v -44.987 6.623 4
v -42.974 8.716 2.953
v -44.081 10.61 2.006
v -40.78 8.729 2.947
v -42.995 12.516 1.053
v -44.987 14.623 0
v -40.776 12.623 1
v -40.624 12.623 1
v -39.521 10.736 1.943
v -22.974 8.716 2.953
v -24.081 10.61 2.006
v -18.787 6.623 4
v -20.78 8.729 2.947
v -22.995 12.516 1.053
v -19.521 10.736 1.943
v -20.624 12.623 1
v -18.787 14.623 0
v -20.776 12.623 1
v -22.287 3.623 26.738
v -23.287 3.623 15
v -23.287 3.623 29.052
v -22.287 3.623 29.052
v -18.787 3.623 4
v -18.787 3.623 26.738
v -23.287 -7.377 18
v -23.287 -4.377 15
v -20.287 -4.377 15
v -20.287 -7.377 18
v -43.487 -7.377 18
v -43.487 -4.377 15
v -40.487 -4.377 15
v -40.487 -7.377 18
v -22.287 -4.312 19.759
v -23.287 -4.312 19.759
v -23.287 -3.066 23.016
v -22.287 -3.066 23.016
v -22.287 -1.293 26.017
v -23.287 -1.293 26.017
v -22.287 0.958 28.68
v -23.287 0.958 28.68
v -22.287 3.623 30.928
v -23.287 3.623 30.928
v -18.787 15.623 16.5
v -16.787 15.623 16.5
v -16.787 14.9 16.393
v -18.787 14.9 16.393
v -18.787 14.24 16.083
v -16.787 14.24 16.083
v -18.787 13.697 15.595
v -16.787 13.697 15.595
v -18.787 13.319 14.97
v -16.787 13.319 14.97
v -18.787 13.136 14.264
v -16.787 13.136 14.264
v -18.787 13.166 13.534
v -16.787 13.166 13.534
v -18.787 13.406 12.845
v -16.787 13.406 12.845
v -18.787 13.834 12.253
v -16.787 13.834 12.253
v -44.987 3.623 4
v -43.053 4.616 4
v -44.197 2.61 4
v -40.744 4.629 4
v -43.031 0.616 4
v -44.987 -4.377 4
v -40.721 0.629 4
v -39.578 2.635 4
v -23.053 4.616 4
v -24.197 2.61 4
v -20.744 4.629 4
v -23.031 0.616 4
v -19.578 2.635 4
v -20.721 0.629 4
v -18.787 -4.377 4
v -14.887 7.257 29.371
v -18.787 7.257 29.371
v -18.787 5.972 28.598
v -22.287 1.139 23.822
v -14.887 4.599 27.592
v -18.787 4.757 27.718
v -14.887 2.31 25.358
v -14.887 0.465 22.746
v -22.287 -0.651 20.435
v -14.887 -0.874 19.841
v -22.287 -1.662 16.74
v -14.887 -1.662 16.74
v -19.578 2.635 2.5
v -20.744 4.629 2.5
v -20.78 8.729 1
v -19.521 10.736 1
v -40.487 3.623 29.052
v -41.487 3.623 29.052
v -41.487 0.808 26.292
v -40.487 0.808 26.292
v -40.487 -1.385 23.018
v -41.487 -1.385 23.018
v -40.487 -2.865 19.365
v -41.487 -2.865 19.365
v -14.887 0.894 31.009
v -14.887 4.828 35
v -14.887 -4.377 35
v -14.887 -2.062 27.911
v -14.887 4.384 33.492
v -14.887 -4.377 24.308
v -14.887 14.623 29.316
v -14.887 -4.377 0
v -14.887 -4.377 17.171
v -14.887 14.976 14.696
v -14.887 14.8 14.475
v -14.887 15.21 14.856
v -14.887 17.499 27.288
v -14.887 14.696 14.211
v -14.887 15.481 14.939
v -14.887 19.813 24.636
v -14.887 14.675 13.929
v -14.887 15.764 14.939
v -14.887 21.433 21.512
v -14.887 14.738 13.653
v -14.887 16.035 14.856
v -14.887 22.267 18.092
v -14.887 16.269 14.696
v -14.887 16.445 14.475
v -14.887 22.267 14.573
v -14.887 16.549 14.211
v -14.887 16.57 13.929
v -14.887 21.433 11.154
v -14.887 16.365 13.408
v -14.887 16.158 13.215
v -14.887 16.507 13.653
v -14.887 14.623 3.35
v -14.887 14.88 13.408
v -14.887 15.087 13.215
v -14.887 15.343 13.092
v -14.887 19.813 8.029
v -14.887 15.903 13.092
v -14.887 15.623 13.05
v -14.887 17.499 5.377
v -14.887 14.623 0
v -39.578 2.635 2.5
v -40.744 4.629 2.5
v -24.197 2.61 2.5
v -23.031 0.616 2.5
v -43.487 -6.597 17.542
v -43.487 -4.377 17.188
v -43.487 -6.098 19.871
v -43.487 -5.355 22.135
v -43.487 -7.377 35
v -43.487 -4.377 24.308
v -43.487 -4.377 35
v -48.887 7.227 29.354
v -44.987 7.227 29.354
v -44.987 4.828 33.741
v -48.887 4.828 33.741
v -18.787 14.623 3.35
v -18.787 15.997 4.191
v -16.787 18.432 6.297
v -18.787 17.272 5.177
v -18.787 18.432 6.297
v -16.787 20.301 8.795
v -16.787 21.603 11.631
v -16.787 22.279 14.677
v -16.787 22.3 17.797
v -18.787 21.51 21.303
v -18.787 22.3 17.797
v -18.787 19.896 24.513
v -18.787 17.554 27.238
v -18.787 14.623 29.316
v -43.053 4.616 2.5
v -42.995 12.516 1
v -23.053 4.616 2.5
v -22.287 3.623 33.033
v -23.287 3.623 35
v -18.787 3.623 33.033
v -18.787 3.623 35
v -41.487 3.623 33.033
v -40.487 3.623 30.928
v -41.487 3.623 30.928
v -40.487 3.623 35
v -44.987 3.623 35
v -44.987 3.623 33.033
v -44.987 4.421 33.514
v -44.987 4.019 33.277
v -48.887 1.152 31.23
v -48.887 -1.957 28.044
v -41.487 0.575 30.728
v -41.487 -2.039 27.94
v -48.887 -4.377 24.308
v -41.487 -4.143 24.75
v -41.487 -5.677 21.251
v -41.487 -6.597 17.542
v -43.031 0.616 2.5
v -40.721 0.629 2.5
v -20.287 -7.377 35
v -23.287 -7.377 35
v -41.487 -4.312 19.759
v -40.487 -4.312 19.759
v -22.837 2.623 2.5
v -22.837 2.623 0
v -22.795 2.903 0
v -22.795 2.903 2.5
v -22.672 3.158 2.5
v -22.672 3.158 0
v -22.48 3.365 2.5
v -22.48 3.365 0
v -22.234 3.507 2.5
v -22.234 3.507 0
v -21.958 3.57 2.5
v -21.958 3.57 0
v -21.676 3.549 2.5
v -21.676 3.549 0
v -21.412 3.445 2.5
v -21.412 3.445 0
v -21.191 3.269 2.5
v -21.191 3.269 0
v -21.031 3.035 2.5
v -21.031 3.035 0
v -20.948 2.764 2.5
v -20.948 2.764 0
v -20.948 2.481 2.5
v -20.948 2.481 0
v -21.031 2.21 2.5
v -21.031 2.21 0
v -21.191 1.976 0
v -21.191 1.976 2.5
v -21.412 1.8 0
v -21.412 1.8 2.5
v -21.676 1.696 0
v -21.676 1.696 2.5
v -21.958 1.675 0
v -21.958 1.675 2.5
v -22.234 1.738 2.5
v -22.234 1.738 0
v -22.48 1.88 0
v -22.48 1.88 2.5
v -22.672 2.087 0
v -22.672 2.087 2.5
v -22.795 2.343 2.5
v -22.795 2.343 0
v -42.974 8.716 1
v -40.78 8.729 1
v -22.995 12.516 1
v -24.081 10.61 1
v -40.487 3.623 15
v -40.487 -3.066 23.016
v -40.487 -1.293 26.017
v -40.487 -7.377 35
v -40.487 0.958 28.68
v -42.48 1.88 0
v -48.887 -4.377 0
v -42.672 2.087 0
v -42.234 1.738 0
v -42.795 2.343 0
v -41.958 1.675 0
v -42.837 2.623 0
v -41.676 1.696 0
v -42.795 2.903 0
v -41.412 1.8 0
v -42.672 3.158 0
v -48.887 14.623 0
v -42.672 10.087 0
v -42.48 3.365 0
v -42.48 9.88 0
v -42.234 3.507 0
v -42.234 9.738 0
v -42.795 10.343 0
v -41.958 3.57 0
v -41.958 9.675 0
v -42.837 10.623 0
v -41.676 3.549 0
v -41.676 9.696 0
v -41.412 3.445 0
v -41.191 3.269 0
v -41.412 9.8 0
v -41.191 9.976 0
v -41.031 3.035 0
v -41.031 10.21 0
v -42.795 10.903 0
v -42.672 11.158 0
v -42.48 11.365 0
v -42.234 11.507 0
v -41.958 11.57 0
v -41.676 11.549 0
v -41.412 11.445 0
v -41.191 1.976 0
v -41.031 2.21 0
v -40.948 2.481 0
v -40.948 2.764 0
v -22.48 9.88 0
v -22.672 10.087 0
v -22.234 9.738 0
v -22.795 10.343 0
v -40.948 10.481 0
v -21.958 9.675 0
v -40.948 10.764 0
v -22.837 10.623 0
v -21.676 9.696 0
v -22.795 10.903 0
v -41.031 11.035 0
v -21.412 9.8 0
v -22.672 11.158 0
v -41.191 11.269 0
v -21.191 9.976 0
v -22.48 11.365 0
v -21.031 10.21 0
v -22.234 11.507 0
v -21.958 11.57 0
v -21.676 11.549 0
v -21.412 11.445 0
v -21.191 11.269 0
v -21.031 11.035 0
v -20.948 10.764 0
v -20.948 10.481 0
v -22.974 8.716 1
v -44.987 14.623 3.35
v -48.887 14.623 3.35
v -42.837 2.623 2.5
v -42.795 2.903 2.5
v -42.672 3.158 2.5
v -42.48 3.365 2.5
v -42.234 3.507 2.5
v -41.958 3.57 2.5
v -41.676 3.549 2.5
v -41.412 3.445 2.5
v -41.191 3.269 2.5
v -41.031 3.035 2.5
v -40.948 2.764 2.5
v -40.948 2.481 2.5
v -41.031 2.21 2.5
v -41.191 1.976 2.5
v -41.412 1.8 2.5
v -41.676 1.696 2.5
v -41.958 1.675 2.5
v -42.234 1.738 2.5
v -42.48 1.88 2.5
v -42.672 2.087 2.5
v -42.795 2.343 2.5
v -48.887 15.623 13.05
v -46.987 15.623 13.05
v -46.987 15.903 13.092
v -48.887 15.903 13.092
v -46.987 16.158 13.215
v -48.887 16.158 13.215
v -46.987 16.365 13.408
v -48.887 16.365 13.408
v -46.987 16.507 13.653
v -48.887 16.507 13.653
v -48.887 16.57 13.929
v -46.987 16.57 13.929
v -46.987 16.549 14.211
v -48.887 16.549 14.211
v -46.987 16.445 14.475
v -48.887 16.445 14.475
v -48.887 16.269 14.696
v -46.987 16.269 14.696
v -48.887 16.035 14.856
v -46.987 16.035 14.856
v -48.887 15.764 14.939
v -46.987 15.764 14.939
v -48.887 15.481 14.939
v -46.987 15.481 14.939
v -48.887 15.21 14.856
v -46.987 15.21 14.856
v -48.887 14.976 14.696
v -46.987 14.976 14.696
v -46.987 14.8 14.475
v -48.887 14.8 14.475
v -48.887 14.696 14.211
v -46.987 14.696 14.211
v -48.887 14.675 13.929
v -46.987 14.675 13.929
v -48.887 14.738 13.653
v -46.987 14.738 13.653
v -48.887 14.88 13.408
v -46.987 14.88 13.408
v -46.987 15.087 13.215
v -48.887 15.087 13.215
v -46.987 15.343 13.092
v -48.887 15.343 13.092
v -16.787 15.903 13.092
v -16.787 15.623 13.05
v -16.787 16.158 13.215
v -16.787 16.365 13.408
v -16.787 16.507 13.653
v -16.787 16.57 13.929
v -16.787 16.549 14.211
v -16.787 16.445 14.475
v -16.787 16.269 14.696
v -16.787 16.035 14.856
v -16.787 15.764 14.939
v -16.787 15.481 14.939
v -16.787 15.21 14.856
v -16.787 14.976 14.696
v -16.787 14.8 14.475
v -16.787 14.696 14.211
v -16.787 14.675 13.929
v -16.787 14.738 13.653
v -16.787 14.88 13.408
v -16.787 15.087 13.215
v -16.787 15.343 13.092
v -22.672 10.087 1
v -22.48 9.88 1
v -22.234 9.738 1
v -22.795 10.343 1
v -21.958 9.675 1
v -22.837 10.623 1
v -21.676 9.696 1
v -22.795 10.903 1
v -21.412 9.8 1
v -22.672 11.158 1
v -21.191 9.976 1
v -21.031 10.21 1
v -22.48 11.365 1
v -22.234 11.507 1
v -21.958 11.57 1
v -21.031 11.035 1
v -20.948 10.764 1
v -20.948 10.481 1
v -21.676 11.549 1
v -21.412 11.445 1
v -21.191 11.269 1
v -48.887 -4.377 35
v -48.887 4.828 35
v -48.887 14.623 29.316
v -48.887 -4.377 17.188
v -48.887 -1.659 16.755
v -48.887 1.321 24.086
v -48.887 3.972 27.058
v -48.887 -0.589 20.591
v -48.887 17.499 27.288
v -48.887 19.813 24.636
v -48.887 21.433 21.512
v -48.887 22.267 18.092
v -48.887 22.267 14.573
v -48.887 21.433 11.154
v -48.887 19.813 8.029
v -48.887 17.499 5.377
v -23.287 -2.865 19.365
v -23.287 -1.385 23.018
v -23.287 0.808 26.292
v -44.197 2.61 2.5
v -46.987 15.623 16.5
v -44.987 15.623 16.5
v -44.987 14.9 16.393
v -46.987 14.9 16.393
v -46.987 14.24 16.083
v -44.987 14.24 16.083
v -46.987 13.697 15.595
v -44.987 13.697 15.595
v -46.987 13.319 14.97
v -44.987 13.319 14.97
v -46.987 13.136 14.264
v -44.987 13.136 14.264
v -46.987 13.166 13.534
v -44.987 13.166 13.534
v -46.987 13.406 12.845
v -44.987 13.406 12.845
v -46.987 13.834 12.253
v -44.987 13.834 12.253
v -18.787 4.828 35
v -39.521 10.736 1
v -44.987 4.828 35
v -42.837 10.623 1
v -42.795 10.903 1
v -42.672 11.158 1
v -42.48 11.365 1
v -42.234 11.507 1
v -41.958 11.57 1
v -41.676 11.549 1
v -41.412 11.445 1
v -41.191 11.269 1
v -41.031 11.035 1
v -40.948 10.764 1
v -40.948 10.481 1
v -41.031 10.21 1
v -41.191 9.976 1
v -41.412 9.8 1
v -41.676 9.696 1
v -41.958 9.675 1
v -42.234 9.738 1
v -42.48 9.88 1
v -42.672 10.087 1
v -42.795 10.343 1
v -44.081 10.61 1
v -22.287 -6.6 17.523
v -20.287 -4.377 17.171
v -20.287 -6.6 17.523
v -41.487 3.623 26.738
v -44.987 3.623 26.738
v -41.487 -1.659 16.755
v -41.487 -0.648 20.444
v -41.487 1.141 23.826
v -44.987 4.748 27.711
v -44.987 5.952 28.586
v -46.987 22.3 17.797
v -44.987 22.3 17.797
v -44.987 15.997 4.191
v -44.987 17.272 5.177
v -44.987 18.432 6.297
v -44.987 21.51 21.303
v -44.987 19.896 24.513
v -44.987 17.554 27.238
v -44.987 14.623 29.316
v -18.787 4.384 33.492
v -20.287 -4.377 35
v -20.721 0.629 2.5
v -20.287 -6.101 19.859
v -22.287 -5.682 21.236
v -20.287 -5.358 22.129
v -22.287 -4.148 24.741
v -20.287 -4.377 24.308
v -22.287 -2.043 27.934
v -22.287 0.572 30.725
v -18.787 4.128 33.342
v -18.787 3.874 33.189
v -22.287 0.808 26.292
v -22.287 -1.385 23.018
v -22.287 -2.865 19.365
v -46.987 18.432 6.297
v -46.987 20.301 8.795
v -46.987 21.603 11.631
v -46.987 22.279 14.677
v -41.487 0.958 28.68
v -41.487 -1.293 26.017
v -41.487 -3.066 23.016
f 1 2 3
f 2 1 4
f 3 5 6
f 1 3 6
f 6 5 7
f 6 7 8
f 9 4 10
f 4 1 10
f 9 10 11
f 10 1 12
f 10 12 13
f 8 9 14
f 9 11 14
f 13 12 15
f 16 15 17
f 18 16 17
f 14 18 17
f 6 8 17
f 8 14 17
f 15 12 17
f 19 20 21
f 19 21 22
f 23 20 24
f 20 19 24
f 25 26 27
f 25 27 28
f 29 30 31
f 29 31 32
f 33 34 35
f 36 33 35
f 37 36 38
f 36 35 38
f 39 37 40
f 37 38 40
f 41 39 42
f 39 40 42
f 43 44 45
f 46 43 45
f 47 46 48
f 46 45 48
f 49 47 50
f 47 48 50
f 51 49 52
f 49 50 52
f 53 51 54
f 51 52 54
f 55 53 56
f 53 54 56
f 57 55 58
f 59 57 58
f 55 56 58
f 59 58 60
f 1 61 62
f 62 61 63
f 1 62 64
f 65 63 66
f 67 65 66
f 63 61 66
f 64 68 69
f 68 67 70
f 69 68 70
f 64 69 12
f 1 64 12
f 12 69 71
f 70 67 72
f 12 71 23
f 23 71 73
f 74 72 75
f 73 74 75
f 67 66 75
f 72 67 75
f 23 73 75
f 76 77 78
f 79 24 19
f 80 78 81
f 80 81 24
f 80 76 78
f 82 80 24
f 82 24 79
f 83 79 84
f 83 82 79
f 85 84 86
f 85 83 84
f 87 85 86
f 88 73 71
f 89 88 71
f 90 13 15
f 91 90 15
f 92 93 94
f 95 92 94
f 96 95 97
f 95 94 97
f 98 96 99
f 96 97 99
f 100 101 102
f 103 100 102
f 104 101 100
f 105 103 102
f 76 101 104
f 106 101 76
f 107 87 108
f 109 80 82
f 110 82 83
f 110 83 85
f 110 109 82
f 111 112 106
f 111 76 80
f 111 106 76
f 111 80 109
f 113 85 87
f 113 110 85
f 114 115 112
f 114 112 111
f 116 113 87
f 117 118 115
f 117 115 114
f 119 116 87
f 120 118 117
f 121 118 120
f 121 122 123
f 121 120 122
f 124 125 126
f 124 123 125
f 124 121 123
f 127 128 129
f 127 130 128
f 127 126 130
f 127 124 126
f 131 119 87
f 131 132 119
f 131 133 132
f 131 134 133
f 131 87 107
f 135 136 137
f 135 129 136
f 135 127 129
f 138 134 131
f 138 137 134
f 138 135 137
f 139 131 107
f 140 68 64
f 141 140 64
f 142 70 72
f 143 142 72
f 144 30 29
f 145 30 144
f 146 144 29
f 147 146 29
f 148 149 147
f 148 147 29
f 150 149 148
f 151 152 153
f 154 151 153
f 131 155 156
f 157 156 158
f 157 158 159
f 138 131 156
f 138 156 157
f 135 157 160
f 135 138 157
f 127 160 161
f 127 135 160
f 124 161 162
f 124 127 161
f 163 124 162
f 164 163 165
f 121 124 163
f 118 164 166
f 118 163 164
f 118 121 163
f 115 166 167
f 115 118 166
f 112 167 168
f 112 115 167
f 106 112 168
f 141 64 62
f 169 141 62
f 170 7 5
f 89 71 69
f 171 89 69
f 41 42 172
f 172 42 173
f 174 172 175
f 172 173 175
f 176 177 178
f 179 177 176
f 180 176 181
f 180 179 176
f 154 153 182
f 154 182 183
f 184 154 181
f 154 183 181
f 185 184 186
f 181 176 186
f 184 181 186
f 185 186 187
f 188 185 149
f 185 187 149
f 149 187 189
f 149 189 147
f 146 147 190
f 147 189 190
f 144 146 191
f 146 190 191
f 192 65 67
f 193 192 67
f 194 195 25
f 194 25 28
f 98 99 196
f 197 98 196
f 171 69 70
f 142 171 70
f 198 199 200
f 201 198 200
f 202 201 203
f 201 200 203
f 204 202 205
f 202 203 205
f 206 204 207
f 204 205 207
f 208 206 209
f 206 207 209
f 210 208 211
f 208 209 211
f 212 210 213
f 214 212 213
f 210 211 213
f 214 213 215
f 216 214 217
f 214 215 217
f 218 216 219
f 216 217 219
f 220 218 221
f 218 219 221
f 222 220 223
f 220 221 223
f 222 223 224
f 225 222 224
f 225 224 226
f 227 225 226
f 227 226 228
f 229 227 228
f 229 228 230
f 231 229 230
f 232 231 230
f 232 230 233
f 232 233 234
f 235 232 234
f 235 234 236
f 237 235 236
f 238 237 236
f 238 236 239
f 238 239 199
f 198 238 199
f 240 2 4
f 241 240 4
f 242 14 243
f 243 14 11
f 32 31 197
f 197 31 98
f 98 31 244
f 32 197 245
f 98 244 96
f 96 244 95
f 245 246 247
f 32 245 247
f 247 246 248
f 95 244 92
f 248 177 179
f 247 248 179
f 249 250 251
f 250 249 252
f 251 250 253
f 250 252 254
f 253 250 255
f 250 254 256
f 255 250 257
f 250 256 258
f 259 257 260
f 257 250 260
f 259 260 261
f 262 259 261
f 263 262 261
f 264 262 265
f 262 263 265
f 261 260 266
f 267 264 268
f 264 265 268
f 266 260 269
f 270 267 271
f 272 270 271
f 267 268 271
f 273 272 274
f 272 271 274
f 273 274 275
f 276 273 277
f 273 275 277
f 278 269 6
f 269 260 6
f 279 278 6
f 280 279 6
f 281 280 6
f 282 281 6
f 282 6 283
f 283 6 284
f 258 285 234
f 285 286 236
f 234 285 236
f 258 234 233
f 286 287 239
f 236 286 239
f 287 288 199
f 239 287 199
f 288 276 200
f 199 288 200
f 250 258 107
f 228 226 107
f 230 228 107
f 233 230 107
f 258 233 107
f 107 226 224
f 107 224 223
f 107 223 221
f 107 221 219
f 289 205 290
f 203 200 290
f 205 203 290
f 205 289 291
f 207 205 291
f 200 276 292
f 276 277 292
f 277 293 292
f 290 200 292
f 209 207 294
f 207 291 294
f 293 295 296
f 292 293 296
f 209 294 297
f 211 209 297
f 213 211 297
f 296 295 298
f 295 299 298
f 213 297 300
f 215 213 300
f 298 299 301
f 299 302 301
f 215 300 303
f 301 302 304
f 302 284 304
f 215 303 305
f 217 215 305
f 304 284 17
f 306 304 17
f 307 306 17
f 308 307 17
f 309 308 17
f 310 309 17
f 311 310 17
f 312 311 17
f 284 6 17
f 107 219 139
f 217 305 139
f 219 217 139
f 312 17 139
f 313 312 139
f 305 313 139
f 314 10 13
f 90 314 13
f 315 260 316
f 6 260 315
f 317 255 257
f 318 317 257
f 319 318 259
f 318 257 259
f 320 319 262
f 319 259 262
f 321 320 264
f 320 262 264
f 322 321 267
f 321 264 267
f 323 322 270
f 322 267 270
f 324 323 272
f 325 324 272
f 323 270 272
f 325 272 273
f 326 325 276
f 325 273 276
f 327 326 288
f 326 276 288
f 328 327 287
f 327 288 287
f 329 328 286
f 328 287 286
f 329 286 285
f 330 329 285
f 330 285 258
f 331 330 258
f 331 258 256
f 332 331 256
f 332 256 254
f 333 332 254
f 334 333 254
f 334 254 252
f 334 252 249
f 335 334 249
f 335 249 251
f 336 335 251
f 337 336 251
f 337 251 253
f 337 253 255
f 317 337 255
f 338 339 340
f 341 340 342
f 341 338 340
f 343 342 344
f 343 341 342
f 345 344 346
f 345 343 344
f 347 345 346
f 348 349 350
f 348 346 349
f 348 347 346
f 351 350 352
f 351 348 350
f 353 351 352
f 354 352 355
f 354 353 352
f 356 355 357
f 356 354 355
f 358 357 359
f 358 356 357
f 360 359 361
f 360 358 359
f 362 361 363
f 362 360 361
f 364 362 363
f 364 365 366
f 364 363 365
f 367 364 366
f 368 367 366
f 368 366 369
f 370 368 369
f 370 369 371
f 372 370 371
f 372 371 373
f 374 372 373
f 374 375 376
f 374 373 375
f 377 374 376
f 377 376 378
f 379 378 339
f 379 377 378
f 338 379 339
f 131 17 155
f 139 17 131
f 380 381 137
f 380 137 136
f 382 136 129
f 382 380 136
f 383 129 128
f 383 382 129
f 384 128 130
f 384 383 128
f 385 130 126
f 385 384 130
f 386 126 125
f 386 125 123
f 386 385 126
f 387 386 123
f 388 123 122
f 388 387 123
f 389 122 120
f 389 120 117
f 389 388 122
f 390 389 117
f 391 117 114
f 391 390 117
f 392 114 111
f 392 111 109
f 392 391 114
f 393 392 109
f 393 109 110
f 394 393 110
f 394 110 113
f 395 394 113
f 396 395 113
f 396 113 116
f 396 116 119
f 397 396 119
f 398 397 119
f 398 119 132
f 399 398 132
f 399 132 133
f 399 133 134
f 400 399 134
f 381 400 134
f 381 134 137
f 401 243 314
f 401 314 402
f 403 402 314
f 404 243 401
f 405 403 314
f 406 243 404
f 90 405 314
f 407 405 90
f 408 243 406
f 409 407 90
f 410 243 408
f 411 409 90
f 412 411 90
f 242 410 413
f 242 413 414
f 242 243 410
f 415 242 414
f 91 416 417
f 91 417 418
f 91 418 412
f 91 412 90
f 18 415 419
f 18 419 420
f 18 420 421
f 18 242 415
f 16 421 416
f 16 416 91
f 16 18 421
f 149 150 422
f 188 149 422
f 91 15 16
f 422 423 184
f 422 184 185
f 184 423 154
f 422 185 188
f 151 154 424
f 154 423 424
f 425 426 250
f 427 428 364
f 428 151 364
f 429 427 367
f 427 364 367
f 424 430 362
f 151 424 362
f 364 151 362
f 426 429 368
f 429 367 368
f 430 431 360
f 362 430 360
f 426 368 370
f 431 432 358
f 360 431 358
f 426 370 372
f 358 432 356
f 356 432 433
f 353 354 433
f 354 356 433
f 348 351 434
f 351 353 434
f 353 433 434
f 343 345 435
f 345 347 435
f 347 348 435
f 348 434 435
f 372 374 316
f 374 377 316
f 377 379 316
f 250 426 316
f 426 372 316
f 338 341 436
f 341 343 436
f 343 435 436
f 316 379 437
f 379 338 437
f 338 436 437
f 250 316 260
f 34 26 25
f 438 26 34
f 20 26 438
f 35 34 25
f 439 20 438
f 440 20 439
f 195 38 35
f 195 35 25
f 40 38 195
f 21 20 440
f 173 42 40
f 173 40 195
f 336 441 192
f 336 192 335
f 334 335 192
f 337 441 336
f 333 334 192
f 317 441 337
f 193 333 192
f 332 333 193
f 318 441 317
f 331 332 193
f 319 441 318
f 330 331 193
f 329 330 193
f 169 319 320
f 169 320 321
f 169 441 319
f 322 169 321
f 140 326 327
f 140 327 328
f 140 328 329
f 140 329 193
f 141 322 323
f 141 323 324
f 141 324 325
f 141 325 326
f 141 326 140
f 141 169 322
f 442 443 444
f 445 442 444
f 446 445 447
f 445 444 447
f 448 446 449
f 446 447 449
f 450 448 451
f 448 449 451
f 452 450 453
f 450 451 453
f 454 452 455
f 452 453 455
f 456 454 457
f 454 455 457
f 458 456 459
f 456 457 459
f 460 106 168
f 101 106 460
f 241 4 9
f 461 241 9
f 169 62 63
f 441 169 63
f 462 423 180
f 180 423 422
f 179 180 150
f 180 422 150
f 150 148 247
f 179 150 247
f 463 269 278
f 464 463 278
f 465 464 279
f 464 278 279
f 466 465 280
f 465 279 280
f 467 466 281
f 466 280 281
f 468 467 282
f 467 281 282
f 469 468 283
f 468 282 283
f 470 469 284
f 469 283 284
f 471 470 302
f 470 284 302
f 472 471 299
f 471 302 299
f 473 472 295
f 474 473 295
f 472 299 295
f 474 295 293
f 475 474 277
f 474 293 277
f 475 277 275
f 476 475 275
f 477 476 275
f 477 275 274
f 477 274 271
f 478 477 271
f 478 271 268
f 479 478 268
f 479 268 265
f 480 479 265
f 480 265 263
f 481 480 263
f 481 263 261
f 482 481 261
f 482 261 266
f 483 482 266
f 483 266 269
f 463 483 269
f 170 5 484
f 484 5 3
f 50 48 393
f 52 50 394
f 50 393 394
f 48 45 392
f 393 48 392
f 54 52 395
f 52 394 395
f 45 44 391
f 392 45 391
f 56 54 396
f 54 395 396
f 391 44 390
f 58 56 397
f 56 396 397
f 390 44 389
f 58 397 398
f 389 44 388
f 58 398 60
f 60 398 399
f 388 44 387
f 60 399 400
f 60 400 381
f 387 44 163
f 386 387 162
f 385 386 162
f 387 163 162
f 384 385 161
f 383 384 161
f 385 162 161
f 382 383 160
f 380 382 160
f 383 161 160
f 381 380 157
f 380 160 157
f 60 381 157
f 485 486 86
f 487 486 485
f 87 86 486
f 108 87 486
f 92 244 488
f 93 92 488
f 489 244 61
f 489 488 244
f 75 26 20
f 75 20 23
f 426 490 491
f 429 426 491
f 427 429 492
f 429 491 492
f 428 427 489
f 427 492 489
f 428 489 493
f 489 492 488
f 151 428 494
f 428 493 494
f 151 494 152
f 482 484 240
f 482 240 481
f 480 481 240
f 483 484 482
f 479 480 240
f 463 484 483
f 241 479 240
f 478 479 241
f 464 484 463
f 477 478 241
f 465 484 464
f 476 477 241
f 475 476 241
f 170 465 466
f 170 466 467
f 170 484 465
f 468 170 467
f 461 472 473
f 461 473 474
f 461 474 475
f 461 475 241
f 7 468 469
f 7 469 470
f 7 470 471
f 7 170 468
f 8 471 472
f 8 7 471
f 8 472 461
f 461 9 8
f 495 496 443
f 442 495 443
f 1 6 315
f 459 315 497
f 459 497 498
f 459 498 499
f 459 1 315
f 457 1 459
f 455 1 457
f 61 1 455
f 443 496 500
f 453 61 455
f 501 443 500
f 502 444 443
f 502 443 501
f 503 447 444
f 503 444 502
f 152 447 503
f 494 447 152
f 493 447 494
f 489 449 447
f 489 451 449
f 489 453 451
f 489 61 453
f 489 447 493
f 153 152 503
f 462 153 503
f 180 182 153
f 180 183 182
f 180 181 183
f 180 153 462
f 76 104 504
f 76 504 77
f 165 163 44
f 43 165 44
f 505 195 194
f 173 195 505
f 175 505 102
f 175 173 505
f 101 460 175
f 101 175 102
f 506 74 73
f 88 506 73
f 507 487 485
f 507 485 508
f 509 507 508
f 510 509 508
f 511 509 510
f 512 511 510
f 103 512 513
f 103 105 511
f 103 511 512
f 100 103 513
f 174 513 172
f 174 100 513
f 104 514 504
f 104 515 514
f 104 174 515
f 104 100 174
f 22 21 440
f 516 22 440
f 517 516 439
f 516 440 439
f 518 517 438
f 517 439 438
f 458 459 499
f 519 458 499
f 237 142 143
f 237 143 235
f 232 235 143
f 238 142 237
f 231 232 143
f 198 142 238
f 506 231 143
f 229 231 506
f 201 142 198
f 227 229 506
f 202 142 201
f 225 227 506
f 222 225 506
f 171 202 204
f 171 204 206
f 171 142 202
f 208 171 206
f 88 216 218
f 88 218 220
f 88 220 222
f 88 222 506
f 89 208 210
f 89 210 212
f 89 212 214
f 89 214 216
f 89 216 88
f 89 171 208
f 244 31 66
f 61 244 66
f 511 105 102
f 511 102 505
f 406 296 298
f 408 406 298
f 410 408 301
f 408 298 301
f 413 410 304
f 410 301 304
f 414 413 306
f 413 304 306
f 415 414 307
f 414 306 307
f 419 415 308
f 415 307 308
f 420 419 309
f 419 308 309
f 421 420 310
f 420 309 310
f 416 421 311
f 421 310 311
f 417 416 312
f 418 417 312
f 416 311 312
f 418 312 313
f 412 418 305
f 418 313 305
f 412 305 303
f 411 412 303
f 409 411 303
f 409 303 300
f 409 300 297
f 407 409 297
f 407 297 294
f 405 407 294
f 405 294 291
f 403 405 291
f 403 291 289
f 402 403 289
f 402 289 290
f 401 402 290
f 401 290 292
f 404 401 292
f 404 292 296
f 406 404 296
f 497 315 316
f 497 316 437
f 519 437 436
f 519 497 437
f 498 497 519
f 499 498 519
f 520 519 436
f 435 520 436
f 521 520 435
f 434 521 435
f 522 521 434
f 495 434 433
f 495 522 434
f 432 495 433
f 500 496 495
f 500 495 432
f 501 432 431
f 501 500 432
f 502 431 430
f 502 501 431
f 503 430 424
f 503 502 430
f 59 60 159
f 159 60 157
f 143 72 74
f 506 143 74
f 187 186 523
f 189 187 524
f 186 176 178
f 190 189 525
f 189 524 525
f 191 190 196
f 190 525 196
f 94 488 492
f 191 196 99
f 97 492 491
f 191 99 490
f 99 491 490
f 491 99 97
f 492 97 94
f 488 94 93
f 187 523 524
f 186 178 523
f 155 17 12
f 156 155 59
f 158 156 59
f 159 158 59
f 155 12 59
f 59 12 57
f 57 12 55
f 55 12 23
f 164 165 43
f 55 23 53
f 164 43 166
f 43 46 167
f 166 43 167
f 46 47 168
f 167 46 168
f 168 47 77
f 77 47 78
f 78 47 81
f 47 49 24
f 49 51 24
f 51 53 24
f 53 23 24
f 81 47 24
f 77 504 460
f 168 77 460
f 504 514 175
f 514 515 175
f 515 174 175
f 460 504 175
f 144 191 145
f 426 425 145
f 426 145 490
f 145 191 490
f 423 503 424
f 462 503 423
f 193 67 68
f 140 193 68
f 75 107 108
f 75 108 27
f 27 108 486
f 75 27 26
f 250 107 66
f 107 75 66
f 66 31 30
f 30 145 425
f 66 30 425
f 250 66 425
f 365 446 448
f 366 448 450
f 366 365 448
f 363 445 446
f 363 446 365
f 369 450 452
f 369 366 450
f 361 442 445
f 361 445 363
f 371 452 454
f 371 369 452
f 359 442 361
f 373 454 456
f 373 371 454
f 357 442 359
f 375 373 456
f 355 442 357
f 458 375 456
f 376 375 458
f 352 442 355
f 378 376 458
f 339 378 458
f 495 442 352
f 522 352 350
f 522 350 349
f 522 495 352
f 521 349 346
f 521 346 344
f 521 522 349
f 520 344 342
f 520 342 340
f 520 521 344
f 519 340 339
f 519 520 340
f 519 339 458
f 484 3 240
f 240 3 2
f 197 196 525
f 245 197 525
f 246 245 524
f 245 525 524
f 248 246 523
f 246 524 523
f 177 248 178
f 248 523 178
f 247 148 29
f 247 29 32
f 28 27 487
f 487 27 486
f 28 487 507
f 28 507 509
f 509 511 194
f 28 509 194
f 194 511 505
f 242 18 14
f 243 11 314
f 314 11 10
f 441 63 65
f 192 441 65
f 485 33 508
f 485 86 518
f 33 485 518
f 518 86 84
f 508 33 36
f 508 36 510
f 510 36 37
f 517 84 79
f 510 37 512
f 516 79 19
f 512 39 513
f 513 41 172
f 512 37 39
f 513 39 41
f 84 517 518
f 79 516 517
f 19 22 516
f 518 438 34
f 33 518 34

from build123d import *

# Parameters (mm, degrees)
CROQUIS1_W              = 34
CROQUIS1_H              = 19
SALIENTE_EXTRUIR1_DEPTH = 35
CROQUIS2_W              = 26.2
CROQUIS2_H              = 31
CORTAR_EXTRUIR1_DEPTH   = 25
CORTAR_EXTRUIR3_DEPTH   = 26.2
SALIENTE_EXTRUIR2_DEPTH = 34
CROQUIS10_W             = 26.2
CROQUIS10_H             = 25.966324345
CORTAR_EXTRUIR4_DEPTH   = 10
CROQUIS18_R             = 0.95
CORTAR_EXTRUIR11_DEPTH  = 4
CORTAR_EXTRUIR12_DEPTH  = 1.5
CORTAR_EXTRUIR13_DEPTH  = 3
CORTAR_EXTRUIR14_START  = -34
CROQUIS21_R             = 0.95
CORTAR_EXTRUIR14_DEPTH  = 34
SALIENTE_EXTRUIR3_DEPTH = 8
CORTAR_EXTRUIR16_START  = -34
CORTAR_EXTRUIR16_DEPTH  = 34
CROQUIS25_W             = 3
CROQUIS25_H             = 20
SALIENTE_EXTRUIR4_DEPTH = 3
CORTAR_EXTRUIR17_START  = -23.2
CORTAR_EXTRUIR17_DEPTH  = 23.2
CORTAR_EXTRUIR18_DEPTH  = 7.4
CORTAR_EXTRUIR19_START  = -7.4
CORTAR_EXTRUIR19_DEPTH  = 7.4
CORTAR_EXTRUIR20_START  = -2
CORTAR_EXTRUIR20_DEPTH  = 2
CORTAR_EXTRUIR21_DEPTH  = 28.2
CORTAR_EXTRUIR22_START  = -34
CORTAR_EXTRUIR22_DEPTH  = 34


with BuildPart() as part:
    # Croquis1 → Saliente-Extruir1 (new body)
    with BuildSketch(Plane.XY):
        with Locations((-31.887263086, 5.12254902)):
            Rectangle(CROQUIS1_W, CROQUIS1_H)
    extrude(amount=SALIENTE_EXTRUIR1_DEPTH)

    # Croquis2 → Cortar-Extruir1 (cut)
    with BuildSketch(Plane.XZ.offset(4.37745098)):
        with Locations((-31.887263086, 19.5)):
            Rectangle(CROQUIS2_W, CROQUIS2_H)
    extrude(amount=-CORTAR_EXTRUIR1_DEPTH, mode=Mode.SUBTRACT)

    # Croquis4 → Cortar-Extruir3 (cut)
    with BuildSketch(Plane.ZY.offset(18.787263086)):
        Polygon((4, 14.62254902), (4, 6.62254902), (0, 14.62254902), align=None)
    extrude(amount=CORTAR_EXTRUIR3_DEPTH, mode=Mode.SUBTRACT)

    # Croquis9 → Saliente-Extruir2 (add)
    with BuildSketch(Plane(origin=(-14.887263086, 0, 0), x_dir=(0, 0, -1), z_dir=(1, 0, 0))):
        with BuildLine():
            Line((-29.315831827, 14.62254902), (-3.349507482, 14.62254902))
            ThreePointArc((-3.349507482, 14.62254902), (-16.332669655, 22.37254902), (-29.315831827, 14.62254902))
        make_face()
    extrude(amount=-SALIENTE_EXTRUIR2_DEPTH)

    # Croquis10 → Cortar-Extruir4 (cut)
    with BuildSketch(Plane.XZ.offset(-14.62254902)):
        with Locations((-31.887263086, 16.332669655)):
            Rectangle(CROQUIS10_W, CROQUIS10_H)
    extrude(amount=-CORTAR_EXTRUIR4_DEPTH, mode=Mode.SUBTRACT)

    # Croquis18 → Cortar-Extruir11 (cut)
    with BuildSketch(Plane(origin=(0, 0, 0), x_dir=(-1, 0, 0), z_dir=(0, 0, -1))):
        with Locations((41.887263086, 2.62254902)):
            Circle(CROQUIS18_R)
        with Locations((21.887263086, 2.62254902)):
            Circle(CROQUIS18_R)
        with Locations((21.887263086, 10.62254902)):
            Circle(CROQUIS18_R)
        with Locations((41.887263086, 10.62254902)):
            Circle(CROQUIS18_R)
    extrude(amount=-CORTAR_EXTRUIR11_DEPTH, mode=Mode.SUBTRACT)

    # Croquis19 → Cortar-Extruir12 (cut)
    with BuildSketch(Plane.XY.offset(4)):
        Polygon((-43.030772734, 0.616129568), (-40.721407694, 0.629030888), (-39.577898045, 2.63545034), (-40.743753437, 4.628968471), (-43.053118477, 4.616067151), (-44.196628126, 2.609647699), align=None)
        Polygon((-23.030772734, 0.616129568), (-20.721407694, 0.629030888), (-19.577898045, 2.63545034), (-20.743753437, 4.628968471), (-23.053118477, 4.616067151), (-24.196628126, 2.609647699), align=None)
    extrude(amount=-CORTAR_EXTRUIR12_DEPTH, mode=Mode.SUBTRACT)

    # Croquis20 → Cortar-Extruir13 (cut)
    with BuildSketch(Plane.XY.offset(4)):
        Polygon((-44.081159874, 10.610292765), (-42.973597252, 8.71645054), (-40.779700463, 8.728706795), (-39.520722563, 10.735771313), (-40.628285185, 12.629613538), (-42.994825708, 12.516391244), align=None)
        Polygon((-24.081159874, 10.610292765), (-22.973597252, 8.71645054), (-20.779700463, 8.728706795), (-19.520722563, 10.735771313), (-20.628285185, 12.629613538), (-22.994825708, 12.516391244), align=None)
    extrude(amount=-CORTAR_EXTRUIR13_DEPTH, mode=Mode.SUBTRACT)

    # Croquis21 → Cortar-Extruir14 (cut)
    with BuildSketch(Plane(origin=(-14.887263086, 0, 0), x_dir=(0, 0, -1), z_dir=(1, 0, 0)).offset(CORTAR_EXTRUIR14_START)):
        with Locations((-14, 15.62254902)):
            Circle(CROQUIS21_R)
    extrude(amount=CORTAR_EXTRUIR14_DEPTH, mode=Mode.SUBTRACT)

    # Croquis23 → Saliente-Extruir3 (add)
    with BuildSketch(Plane.XZ.offset(4.37745098)):
        Polygon((-44.987263086, 35), (-40.487263086, 35), (-40.487263086, 15), (-44.987263086, 4), align=None)
        Polygon((-18.787263086, 35), (-23.287263086, 35), (-23.287263086, 15), (-18.787263086, 4), align=None)
    extrude(amount=-SALIENTE_EXTRUIR3_DEPTH)

    # Croquis24 → Cortar-Extruir16 (cut)
    with BuildSketch(Plane(origin=(-14.887263086, 0, 0), x_dir=(0, 0, -1), z_dir=(1, 0, 0)).offset(CORTAR_EXTRUIR16_START)):
        with BuildLine():
            Line((-19.364815558, -2.86477783), (-19.759303848, -4.311974772))
            ThreePointArc((-19.759303848, -4.311974772), (-26.555897405, -0.897265142), (-31.665347016, 4.737222456))
            Line((-31.665347016, 4.737222456), (-30.432986509, 5.596609942))
            ThreePointArc((-30.432986509, 5.596609942), (-25.6912281, 0.329488976), (-19.364815558, -2.86477783))
        make_face()
    extrude(amount=CORTAR_EXTRUIR16_DEPTH, mode=Mode.SUBTRACT)

    # Croquis25 → Saliente-Extruir4 (add)
    with BuildSketch(Plane.XZ.offset(4.37745098)):
        with Locations((-21.787263086, 25)):
            Rectangle(CROQUIS25_W, CROQUIS25_H)
        with Locations((-41.987263086, 25)):
            Rectangle(CROQUIS25_W, CROQUIS25_H)
    extrude(amount=SALIENTE_EXTRUIR4_DEPTH)

    # Croquis26 → Cortar-Extruir17 (cut)
    with BuildSketch(Plane(origin=(-20.287263086, 0, 0), x_dir=(0, 0, -1), z_dir=(1, 0, 0)).offset(CORTAR_EXTRUIR17_START)):
        Polygon((-18, -7.37745098), (-15, -7.37745098), (-15, -4.37745098), align=None)
    extrude(amount=CORTAR_EXTRUIR17_DEPTH, mode=Mode.SUBTRACT)

    # Croquis27 → Cortar-Extruir18 (cut)
    with BuildSketch(Plane(origin=(-14.887263086, 0, 0), x_dir=(0, 0, -1), z_dir=(1, 0, 0))):
        with BuildLine():
            Line((-16.740334426, -1.661564126), (-17.523287119, -6.599882168))
            ThreePointArc((-17.523287119, -6.599882168), (-26.750931424, -2.915621004), (-33.492032026, 4.383746258))
            Line((-33.492032026, 4.383746258), (-29.371216121, 7.25740019))
            ThreePointArc((-29.371216121, 7.25740019), (-24.094258117, 1.327236743), (-16.740334426, -1.661564126))
        make_face()
    extrude(amount=-CORTAR_EXTRUIR18_DEPTH, mode=Mode.SUBTRACT)

    # Croquis28 → Cortar-Extruir19 (cut)
    with BuildSketch(Plane.ZY.offset(48.887263086).offset(CORTAR_EXTRUIR19_START)):
        with BuildLine():
            Line((29.35443361, 7.226635221), (33.741414641, 4.827802707))
            ThreePointArc((33.741414641, 4.827802707), (26.967501757, -2.764780808), (17.541604251, -6.596970312))
            Line((17.541604251, -6.596970312), (16.754581084, -1.659299349))
            ThreePointArc((16.754581084, -1.659299349), (24.0858347, 1.321292487), (29.35443361, 7.226635221))
        make_face()
    extrude(amount=CORTAR_EXTRUIR19_DEPTH, mode=Mode.SUBTRACT)

    # Croquis29 → Cortar-Extruir20 (cut)
    with BuildSketch(Plane.ZY.offset(18.787263086).offset(CORTAR_EXTRUIR20_START)):
        with BuildLine():
            Line((17.797402962, 22.299641931), (16.5, 15.62254902))
            ThreePointArc((16.5, 15.62254902), (14.970464446, 13.318596164), (12.253440993, 13.833825555))
            Line((12.253440993, 13.833825555), (6.296886003, 18.432060872))
            ThreePointArc((6.296886003, 18.432060872), (11.631045274, 21.603150873), (17.797402962, 22.299641931))
        make_face()
    extrude(amount=CORTAR_EXTRUIR20_DEPTH, mode=Mode.SUBTRACT)

    # Croquis29<2> → Cortar-Extruir21 (cut)
    with BuildSketch(Plane.ZY.offset(18.787263086)):
        with BuildLine():
            Line((17.797402962, 22.299641931), (16.5, 15.62254902))
            ThreePointArc((16.5, 15.62254902), (14.970464446, 13.318596164), (12.253440993, 13.833825555))
            Line((12.253440993, 13.833825555), (6.296886003, 18.432060872))
            ThreePointArc((6.296886003, 18.432060872), (11.631045274, 21.603150873), (17.797402962, 22.299641931))
        make_face()
    extrude(amount=CORTAR_EXTRUIR21_DEPTH, mode=Mode.SUBTRACT)

    # Croquis30 → Cortar-Extruir22 (cut)
    with BuildSketch(Plane.ZY.offset(48.887263086).offset(CORTAR_EXTRUIR22_START)):
        Polygon((29.315831827, 14.62254902), (35, 4.827802707), (35, 14.62254902), align=None)
    extrude(amount=CORTAR_EXTRUIR22_DEPTH, mode=Mode.SUBTRACT)


solid = part.part
